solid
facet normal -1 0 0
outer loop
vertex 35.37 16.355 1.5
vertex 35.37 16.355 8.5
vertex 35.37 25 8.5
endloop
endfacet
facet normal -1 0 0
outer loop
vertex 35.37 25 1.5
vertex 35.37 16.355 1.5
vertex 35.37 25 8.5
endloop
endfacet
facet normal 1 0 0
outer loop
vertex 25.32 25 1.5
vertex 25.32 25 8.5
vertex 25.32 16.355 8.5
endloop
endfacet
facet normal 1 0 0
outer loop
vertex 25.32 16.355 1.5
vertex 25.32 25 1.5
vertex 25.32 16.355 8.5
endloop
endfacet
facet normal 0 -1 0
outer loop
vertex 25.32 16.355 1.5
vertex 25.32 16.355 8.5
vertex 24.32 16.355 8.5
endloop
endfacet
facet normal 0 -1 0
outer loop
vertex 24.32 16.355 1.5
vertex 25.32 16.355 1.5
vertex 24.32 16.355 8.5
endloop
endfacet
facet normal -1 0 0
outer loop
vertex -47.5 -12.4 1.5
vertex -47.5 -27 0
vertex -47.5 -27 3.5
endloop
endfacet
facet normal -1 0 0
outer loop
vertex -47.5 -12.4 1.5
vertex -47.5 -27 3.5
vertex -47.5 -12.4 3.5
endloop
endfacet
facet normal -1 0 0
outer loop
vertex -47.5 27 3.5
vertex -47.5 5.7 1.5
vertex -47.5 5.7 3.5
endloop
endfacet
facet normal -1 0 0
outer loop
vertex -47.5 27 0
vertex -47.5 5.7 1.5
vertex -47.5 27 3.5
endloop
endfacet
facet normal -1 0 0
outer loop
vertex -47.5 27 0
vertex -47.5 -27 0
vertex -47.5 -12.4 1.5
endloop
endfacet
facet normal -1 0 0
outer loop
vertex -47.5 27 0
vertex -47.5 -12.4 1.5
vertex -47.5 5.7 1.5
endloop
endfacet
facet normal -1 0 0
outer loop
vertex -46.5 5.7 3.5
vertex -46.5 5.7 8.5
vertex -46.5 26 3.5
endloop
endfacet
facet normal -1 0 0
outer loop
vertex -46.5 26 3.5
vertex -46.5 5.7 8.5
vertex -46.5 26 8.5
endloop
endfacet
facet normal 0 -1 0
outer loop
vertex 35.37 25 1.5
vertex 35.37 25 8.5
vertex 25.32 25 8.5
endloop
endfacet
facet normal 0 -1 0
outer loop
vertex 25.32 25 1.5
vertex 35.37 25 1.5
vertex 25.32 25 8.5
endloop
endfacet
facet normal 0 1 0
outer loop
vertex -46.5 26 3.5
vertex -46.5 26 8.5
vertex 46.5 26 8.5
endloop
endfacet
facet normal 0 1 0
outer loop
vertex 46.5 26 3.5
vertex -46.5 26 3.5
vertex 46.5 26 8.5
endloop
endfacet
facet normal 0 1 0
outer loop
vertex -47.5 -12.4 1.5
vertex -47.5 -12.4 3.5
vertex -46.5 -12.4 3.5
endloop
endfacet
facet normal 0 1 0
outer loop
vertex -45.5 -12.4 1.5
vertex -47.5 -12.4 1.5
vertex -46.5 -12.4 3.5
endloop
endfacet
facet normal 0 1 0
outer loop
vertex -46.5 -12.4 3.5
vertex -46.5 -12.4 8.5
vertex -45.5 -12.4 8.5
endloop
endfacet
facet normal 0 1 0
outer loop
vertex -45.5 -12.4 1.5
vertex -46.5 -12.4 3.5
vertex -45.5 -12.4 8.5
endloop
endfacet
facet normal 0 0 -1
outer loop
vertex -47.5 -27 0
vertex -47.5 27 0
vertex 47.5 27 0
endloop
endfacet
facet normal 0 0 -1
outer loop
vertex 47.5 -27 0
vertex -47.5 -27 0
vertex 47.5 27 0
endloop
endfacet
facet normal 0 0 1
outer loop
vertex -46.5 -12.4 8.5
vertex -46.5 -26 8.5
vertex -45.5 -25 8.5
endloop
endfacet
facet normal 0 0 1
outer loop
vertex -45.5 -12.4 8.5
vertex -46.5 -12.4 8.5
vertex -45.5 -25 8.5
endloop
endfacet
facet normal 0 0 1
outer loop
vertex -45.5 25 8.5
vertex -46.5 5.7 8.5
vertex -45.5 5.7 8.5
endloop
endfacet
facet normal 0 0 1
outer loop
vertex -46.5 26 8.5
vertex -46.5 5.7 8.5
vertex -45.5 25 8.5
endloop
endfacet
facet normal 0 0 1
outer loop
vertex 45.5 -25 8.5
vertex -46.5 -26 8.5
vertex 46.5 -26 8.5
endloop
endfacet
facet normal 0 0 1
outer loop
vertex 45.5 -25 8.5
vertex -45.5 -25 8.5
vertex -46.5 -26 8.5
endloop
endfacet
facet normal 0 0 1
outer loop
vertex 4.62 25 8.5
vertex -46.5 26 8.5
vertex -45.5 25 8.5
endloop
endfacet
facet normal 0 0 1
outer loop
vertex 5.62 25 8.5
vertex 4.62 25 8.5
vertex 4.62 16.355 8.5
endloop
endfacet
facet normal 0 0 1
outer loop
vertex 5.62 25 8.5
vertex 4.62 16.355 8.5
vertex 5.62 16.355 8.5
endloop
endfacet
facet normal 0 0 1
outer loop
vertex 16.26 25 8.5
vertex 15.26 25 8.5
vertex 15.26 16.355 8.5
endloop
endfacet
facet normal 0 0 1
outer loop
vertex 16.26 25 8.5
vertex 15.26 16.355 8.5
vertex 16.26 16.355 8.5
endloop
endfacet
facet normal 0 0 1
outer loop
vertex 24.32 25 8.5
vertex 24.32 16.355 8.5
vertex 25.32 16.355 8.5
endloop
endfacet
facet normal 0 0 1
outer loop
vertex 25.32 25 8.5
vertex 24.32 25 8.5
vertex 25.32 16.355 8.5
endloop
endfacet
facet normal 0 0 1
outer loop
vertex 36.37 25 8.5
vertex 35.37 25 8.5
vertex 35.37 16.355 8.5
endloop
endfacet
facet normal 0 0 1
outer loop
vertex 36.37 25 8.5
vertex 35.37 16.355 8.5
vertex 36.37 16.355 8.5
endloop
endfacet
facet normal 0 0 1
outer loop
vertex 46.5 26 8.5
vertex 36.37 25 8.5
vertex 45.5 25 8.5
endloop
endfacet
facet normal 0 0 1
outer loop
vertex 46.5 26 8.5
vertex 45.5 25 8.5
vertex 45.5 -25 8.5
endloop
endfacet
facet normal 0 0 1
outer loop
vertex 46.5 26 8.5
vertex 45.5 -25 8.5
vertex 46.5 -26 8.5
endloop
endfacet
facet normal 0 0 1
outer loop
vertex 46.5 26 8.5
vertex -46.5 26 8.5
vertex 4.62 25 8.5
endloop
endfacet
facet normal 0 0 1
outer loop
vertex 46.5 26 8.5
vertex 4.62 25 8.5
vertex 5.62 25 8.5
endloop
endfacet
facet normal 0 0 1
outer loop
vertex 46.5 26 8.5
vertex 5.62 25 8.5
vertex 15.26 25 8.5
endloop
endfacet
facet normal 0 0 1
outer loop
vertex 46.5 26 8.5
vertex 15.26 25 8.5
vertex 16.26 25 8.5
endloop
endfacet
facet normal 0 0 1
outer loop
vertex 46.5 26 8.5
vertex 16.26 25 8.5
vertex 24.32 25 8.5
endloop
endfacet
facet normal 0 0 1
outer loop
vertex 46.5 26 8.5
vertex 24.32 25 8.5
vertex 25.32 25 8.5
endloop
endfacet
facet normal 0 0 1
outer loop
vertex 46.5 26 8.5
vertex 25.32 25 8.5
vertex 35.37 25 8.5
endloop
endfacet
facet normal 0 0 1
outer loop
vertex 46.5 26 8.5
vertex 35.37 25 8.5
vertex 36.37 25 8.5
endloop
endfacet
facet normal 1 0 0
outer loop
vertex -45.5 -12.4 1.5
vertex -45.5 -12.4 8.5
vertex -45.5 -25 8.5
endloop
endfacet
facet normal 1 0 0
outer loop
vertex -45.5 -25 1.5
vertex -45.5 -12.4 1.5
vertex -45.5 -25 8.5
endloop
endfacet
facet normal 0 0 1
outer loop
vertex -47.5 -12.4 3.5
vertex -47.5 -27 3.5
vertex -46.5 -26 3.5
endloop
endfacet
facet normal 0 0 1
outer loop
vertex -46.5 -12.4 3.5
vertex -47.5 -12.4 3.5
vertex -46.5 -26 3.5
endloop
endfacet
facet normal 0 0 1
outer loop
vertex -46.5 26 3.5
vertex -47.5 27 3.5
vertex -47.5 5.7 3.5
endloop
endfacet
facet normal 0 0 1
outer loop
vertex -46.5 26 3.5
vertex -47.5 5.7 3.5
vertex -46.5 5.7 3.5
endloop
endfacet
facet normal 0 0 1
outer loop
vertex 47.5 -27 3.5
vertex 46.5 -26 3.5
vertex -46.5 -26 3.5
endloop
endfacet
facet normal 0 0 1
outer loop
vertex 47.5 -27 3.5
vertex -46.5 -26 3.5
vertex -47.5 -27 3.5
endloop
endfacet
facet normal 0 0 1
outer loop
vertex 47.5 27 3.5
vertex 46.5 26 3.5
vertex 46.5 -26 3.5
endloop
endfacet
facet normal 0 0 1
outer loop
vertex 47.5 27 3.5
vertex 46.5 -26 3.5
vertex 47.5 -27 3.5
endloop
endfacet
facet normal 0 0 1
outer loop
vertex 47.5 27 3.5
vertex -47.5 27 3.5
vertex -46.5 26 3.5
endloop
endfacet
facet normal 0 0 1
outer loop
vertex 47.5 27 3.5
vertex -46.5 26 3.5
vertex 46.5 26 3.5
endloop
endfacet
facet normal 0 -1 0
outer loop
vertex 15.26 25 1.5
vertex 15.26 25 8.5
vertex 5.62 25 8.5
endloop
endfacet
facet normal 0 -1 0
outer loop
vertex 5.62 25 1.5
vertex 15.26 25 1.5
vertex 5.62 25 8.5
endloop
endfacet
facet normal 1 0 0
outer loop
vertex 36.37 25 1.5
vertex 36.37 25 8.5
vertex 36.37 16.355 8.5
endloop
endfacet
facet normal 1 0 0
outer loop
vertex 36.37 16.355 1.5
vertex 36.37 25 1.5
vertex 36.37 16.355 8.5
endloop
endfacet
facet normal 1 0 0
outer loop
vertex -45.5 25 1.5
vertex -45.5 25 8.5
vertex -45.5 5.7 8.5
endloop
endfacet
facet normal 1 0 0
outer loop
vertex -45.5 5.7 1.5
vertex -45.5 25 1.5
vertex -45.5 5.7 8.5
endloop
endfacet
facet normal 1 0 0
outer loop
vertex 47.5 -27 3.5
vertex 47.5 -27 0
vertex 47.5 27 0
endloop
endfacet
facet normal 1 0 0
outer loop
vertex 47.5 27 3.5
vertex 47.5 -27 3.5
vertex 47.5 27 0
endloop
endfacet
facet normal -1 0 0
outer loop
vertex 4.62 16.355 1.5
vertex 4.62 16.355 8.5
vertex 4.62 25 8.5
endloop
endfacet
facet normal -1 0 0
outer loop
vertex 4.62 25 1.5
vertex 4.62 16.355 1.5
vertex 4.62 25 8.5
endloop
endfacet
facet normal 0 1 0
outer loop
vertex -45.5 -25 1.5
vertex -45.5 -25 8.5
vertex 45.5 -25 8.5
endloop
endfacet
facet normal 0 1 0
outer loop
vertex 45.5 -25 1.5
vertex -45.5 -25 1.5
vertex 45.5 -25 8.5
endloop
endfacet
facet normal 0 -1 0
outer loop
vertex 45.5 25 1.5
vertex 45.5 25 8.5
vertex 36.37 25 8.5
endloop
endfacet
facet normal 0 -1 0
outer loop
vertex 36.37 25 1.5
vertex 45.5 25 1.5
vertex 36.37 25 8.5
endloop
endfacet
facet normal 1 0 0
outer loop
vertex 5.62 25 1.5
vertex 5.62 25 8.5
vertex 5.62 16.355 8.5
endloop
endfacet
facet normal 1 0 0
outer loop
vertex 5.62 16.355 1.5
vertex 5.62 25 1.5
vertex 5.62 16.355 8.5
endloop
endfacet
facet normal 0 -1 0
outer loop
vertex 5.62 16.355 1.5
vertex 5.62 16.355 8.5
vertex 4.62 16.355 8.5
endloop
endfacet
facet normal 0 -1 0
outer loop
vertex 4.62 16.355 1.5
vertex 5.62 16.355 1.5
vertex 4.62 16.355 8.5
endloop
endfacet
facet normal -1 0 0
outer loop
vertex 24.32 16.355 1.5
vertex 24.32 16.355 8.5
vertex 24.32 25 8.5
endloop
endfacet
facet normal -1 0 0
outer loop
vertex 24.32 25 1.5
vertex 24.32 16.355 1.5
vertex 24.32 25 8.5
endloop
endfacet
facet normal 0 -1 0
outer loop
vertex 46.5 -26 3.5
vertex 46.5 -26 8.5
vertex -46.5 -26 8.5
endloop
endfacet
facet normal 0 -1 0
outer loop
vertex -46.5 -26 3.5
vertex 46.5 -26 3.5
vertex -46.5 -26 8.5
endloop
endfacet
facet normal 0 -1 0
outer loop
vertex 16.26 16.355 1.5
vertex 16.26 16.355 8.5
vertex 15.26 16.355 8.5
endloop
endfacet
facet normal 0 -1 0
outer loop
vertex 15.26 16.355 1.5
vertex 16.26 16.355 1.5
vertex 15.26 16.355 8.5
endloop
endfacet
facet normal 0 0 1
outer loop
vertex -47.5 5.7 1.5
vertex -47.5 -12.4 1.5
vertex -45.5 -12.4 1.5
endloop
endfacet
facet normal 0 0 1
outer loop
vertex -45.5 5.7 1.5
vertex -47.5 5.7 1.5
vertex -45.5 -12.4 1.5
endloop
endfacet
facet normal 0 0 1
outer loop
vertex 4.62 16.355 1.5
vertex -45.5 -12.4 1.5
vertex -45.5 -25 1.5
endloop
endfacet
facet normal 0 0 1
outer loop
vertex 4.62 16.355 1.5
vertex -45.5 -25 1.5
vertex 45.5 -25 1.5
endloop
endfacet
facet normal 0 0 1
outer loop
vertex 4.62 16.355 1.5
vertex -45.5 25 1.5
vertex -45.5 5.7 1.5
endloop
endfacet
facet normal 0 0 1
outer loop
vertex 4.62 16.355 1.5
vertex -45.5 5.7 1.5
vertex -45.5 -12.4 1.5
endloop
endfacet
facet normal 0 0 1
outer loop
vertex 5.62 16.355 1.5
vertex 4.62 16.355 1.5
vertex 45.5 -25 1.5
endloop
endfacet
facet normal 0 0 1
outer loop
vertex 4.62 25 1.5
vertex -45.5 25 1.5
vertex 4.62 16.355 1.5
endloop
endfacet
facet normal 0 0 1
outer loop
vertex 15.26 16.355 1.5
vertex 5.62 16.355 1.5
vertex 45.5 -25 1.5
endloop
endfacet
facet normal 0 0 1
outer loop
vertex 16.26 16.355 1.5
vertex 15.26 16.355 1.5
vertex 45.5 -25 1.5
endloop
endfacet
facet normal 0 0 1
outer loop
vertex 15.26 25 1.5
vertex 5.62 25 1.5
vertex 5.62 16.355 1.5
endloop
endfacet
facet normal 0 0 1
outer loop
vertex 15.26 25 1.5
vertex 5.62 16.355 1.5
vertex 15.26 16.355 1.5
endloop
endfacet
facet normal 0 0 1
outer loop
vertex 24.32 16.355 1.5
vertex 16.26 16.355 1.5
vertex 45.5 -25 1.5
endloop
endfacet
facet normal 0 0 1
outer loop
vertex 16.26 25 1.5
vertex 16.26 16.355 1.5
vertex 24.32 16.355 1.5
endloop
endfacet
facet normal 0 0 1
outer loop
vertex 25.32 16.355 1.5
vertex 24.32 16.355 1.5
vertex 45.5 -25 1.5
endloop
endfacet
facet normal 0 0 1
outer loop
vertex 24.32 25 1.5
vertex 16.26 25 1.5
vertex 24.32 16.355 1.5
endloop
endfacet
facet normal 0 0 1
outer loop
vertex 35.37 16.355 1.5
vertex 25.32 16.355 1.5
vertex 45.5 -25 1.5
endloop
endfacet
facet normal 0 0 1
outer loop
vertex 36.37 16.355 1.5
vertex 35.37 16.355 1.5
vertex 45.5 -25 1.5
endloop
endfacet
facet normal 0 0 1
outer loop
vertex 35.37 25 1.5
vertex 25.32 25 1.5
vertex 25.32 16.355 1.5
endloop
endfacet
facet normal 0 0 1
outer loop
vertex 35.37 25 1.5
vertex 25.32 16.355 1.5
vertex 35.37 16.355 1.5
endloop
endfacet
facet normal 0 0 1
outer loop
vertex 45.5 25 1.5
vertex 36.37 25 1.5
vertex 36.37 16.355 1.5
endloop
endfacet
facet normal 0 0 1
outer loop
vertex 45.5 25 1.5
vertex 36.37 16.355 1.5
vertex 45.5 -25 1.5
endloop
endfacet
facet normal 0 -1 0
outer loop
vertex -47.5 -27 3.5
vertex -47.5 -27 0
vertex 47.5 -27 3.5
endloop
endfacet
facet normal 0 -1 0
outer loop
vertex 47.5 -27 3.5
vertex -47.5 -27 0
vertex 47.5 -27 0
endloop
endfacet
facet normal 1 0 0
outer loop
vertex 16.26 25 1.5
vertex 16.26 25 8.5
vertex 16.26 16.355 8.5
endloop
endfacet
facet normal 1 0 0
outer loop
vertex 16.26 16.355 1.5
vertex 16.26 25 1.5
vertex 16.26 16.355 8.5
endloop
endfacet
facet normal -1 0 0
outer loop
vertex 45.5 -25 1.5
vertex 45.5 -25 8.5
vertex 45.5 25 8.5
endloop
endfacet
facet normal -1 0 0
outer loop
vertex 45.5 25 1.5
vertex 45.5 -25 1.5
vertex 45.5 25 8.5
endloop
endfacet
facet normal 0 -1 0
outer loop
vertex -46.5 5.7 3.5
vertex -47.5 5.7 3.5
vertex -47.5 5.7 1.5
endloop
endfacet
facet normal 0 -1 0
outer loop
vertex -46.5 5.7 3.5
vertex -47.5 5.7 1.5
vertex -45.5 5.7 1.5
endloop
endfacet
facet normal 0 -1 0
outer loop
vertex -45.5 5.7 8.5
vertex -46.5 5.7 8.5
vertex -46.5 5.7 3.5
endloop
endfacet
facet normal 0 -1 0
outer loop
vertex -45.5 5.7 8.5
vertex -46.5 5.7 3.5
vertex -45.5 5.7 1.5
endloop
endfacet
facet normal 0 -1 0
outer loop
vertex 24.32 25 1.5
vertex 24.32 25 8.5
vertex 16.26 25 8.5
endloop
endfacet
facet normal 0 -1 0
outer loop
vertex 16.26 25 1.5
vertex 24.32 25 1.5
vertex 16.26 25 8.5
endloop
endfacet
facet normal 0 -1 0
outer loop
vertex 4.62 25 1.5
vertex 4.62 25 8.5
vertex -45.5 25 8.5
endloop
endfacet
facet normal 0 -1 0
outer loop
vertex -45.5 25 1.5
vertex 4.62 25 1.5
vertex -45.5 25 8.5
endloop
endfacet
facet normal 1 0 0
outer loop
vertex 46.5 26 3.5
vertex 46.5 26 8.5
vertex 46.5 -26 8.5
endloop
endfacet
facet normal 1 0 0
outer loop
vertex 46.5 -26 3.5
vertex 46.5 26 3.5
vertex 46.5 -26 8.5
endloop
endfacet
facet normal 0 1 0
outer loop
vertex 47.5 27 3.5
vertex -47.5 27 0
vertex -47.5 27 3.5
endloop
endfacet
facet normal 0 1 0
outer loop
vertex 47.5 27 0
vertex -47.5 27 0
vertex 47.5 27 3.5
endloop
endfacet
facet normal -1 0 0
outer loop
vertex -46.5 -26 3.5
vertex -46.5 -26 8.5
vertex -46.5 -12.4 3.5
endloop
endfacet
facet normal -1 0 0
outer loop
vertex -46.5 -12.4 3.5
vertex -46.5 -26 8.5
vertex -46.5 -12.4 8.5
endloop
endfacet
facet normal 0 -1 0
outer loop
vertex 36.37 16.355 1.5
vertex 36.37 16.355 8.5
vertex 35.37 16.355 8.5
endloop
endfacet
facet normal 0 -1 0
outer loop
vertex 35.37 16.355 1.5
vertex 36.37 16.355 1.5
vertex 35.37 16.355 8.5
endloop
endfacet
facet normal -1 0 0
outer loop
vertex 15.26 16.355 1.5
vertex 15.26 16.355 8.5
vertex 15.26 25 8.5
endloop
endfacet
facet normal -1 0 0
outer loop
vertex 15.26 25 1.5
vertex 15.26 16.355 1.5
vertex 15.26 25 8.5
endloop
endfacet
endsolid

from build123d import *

# Parameters (mm, degrees)
F0_W     = 95
F0_H     = 54
F1_DEPTH = 8.5
F3_DEPTH = 7
F4_W     = 2
F4_H     = 18.1
F5_DEPTH = 7
F7_DEPTH = 5


with BuildPart() as f1:
    # F0 (on Top) → F1 (new body)
    with BuildSketch(Plane.XY):
        Rectangle(F0_W, F0_H)
    extrude(amount=F1_DEPTH)

    # F2 (on face) → F3 (cut)
    with BuildSketch(Plane.XY.offset(8.5)):
        Polygon((-45.5, 25), (-45.5, -25), (45.5, -25), (45.5, 25), (36.37, 25), (36.37, 16.354831), (35.37, 16.354831), (35.37, 25), (25.32, 25), (25.32, 16.354831), (24.32, 16.354831), (24.32, 25), (16.26, 25), (16.26, 16.354831), (15.26, 16.354831), (15.26, 25), (5.62, 25), (5.62, 16.354831), (4.62, 16.354831), (4.62, 25), align=None)
    extrude(amount=-F3_DEPTH, mode=Mode.SUBTRACT)

    # F4 (on face) → F5 (cut)
    with BuildSketch(Plane.XY.offset(8.5)):
        with Locations((-46.5, -3.35)):
            Rectangle(F4_W, F4_H)
    extrude(amount=-F5_DEPTH, mode=Mode.SUBTRACT)

    # F6 (on face) → F7 (cut)
    with BuildSketch(Plane.XY.offset(8.5)):
        Polygon((46.5, -26), (-46.5, -26), (-46.5, -12.4), (-47.5, -12.4), (-47.5, -27), (47.5, -27), (47.5, 27), (-47.5, 27), (-47.5, 5.7), (-46.5, 5.7), (-46.5, 26), (46.5, 26), align=None)
    extrude(amount=-F7_DEPTH, mode=Mode.SUBTRACT)


solid = f1.part
